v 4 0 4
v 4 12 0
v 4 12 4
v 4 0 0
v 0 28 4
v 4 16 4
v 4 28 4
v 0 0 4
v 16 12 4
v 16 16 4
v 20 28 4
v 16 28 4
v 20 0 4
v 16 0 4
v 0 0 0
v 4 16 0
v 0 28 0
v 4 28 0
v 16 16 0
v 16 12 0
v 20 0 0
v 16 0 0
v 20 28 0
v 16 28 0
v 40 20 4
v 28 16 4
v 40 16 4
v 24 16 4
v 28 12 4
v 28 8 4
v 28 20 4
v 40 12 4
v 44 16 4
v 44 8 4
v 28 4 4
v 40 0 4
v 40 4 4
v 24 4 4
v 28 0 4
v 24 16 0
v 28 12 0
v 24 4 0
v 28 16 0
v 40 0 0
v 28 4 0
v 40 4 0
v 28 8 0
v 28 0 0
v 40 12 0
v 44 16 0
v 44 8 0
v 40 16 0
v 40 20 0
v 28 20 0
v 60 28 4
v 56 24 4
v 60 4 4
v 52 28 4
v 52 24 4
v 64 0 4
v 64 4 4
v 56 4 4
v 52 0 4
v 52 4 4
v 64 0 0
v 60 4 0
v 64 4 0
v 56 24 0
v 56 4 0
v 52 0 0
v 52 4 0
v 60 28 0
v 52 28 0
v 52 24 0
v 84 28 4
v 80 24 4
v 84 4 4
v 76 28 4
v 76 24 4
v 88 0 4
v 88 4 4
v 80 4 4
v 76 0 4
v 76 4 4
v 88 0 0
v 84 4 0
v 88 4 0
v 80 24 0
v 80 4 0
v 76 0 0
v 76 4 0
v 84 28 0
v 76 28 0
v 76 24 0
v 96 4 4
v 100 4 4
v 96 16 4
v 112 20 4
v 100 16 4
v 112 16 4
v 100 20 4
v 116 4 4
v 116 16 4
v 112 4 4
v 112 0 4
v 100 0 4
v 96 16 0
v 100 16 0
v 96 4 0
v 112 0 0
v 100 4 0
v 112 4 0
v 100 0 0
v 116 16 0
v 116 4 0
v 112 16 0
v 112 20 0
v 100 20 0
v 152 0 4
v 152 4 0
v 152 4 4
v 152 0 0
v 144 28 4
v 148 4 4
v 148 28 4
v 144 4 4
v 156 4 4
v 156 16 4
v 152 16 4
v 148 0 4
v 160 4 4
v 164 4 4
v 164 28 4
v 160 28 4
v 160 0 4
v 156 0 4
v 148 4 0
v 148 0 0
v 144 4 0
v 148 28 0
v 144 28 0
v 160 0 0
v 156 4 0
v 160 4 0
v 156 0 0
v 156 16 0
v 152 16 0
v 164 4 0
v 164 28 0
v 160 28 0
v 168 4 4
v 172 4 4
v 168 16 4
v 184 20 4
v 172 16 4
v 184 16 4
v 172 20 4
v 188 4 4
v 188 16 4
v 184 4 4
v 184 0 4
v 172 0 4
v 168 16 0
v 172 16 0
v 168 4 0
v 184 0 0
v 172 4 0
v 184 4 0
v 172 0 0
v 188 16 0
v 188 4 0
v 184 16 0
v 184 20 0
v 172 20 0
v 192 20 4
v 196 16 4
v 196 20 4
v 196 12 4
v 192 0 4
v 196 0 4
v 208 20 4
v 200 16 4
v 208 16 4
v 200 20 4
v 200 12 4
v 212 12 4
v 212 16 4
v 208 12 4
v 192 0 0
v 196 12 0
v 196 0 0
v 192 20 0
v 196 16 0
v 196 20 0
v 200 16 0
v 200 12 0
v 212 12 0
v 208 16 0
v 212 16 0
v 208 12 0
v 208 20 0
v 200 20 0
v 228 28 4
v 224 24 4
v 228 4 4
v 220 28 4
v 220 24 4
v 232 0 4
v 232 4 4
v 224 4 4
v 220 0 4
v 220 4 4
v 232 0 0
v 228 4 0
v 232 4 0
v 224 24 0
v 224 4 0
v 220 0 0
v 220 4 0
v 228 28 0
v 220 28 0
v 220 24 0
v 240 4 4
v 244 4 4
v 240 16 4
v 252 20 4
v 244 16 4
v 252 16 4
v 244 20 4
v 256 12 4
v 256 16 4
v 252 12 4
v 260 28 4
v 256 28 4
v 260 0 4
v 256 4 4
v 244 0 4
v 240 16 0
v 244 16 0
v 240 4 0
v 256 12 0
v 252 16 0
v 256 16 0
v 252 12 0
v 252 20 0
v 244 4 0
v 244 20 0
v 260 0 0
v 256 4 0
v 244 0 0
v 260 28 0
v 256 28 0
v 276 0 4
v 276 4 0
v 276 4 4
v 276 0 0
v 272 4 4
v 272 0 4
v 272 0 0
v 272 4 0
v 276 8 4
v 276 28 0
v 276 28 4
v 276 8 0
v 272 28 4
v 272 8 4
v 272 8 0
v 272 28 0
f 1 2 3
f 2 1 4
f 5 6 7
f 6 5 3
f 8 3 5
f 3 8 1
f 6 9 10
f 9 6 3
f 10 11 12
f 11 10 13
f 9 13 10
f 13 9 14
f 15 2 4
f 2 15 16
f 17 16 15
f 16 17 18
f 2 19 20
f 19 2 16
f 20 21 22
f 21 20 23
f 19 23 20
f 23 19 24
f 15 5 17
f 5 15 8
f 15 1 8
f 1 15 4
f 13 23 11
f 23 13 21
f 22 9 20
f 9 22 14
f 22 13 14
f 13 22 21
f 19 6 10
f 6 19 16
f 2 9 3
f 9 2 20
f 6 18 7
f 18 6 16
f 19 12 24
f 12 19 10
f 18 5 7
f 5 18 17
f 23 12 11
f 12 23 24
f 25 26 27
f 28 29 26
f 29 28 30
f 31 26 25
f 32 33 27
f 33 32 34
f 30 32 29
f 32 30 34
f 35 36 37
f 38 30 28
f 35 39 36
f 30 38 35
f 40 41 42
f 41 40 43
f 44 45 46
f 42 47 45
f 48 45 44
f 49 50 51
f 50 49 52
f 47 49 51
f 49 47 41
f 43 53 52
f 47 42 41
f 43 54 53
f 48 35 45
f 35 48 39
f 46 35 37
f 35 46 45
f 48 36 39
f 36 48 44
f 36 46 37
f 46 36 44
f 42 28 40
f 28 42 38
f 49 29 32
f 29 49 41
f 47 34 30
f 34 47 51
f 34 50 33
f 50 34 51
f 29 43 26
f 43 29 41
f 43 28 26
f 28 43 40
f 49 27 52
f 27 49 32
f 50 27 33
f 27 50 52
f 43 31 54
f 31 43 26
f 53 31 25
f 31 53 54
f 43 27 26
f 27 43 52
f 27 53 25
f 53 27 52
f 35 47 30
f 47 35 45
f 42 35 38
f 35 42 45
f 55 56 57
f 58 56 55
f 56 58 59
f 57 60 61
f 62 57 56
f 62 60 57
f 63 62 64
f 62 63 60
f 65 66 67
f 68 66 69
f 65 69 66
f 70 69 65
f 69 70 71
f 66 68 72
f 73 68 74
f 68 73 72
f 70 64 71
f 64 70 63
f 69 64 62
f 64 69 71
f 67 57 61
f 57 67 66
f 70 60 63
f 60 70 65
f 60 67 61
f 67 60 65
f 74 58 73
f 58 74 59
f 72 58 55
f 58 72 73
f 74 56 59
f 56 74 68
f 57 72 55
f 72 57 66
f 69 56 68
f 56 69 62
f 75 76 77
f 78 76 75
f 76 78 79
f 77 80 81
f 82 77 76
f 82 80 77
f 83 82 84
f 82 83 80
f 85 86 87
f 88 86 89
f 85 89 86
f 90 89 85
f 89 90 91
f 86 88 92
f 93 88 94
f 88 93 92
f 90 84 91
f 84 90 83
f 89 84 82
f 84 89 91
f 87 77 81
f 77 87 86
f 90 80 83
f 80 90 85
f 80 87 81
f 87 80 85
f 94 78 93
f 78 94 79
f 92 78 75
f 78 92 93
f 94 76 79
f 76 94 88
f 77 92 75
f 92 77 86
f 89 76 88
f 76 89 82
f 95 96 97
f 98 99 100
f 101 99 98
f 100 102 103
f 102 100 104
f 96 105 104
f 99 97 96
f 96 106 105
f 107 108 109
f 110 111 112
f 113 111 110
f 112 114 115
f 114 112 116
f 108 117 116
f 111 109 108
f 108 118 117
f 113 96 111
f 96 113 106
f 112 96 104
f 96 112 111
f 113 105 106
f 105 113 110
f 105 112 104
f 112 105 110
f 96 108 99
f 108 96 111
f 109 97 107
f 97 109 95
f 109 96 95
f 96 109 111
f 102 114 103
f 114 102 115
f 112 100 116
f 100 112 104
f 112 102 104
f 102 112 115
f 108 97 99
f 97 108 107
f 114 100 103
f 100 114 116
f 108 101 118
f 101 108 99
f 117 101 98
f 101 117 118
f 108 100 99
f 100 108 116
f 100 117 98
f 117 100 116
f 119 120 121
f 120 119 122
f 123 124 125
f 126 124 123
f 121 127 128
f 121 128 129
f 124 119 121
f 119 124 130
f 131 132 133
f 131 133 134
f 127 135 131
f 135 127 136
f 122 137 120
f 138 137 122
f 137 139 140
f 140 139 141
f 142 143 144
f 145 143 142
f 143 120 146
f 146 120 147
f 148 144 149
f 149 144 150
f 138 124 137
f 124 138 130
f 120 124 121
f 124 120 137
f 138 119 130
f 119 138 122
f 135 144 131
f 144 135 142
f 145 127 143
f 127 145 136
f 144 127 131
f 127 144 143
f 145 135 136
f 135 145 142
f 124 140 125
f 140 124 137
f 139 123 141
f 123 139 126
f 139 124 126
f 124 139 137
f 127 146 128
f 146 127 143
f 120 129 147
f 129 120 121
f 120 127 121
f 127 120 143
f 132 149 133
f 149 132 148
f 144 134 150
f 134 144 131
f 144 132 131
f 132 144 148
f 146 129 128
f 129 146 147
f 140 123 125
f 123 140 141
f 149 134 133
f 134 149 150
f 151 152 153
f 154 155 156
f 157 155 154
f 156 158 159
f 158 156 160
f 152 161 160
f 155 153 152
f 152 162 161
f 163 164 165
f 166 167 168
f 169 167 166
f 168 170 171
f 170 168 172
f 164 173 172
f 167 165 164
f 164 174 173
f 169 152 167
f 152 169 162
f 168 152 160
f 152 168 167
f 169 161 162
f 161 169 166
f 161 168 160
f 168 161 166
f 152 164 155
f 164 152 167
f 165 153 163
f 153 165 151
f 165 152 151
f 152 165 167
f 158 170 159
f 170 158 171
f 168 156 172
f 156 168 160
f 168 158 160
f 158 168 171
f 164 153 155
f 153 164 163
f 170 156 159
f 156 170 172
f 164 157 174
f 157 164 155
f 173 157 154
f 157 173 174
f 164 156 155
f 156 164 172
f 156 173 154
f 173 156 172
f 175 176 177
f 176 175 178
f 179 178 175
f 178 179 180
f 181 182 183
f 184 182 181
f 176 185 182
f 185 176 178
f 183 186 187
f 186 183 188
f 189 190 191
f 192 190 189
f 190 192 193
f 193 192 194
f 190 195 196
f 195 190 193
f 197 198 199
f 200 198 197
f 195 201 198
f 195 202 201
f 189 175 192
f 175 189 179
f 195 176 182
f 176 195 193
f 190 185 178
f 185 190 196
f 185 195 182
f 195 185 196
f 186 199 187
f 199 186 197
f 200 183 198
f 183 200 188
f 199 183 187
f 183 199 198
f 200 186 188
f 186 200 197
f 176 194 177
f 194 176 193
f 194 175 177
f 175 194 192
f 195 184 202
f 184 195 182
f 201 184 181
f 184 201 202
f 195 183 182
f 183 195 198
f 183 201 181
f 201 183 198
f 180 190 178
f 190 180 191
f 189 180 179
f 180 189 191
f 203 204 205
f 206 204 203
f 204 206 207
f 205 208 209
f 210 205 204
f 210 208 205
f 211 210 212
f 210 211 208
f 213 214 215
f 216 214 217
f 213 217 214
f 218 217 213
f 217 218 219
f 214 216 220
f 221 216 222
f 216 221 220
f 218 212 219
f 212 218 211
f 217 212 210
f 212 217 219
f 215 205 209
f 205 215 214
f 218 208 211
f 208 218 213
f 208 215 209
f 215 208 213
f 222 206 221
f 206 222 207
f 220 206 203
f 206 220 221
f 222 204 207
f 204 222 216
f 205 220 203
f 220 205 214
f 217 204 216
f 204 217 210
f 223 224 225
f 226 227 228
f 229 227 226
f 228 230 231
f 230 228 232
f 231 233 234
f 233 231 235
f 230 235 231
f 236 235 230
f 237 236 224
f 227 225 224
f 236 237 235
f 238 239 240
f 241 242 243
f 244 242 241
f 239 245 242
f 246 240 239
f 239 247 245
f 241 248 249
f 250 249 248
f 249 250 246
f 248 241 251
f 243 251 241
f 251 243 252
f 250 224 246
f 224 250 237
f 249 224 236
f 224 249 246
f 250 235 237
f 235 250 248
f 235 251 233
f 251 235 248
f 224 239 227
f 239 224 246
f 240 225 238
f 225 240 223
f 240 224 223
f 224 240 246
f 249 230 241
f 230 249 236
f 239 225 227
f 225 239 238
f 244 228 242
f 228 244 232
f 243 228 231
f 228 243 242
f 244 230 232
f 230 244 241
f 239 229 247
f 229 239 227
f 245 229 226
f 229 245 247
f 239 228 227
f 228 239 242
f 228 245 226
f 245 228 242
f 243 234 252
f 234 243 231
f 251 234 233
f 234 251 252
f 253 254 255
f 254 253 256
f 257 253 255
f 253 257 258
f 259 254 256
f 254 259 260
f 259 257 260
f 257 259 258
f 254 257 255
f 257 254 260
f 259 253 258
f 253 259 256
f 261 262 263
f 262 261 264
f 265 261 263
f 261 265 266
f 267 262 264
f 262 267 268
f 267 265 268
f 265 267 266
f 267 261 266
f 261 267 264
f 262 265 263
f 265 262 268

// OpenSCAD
//Draw text
scale([4,4,4]) drawtext("Hello World!");

//Draw character set
//scale([2,2,2]) drawtext(" !\"#$%&'()*+,-./0123456789:;<=>?@ABCDEFGHIJKLMNOPQRSTUVWXYZ[\\]^_`abcdefghijklmnopqrstuvwxyz{|}");

module drawtext(text) {
	//Characters
	chars = " !\"#$%&'()*+,-./0123456789:;<=>?@ABCDEFGHIJKLMNOPQRSTUVWXYZ[\\]^_`abcdefghijklmnopqrstuvwxyz{|}";

	//Chracter table defining 5x7 characters
	//Adapted from: http://www.geocities.com/dinceraydin/djlcdsim/chartable.js
	char_table = [ [ 0, 0, 0, 0, 0, 0, 0],
                  [ 4, 0, 4, 4, 4, 4, 4],
                  [ 0, 0, 0, 0,10,10,10],
                  [10,10,31,10,31,10,10],
                  [ 4,30, 5,14,20,15, 4],
                  [ 3,19, 8, 4, 2,25,24],
                  [13,18,21, 8,20,18,12],
                  [ 0, 0, 0, 0, 8, 4,12],
                  [ 2, 4, 8, 8, 8, 4, 2],
                  [ 8, 4, 2, 2, 2, 4, 8],
                  [ 0, 4,21,14,21, 4, 0],
                  [ 0, 4, 4,31, 4, 4, 0],
                  [ 8, 4,12, 0, 0, 0, 0],
                  [ 0, 0, 0,31, 0, 0, 0],
                  [12,12, 0, 0, 0, 0, 0],
                  [ 0,16, 8, 4, 2, 1, 0],
                  [14,17,25,21,19,17,14],
                  [14, 4, 4, 4, 4,12, 4],
                  [31, 8, 4, 2, 1,17,14],
                  [14,17, 1, 2, 4, 2,31],
                  [ 2, 2,31,18,10, 6, 2],
                  [14,17, 1, 1,30,16,31],
                  [14,17,17,30,16, 8, 6],
                  [ 8, 8, 8, 4, 2, 1,31],
                  [14,17,17,14,17,17,14],
                  [12, 2, 1,15,17,17,14],
                  [ 0,12,12, 0,12,12, 0],
                  [ 8, 4,12, 0,12,12, 0],
                  [ 2, 4, 8,16, 8, 4, 2],
                  [ 0, 0,31, 0,31, 0, 0],
                  [16, 8, 4, 2, 4, 8,16],
                  [ 4, 0, 4, 2, 1,17,14],
                  [14,21,21,13, 1,17,14],
                  [17,17,31,17,17,17,14],
                  [30,17,17,30,17,17,30],
                  [14,17,16,16,16,17,14],
                  [30,17,17,17,17,17,30],
                  [31,16,16,30,16,16,31],
                  [16,16,16,30,16,16,31],
                  [15,17,17,23,16,17,14],
                  [17,17,17,31,17,17,17],
                  [14, 4, 4, 4, 4, 4,14],
                  [12,18, 2, 2, 2, 2, 7],
                  [17,18,20,24,20,18,17],
                  [31,16,16,16,16,16,16],
                  [17,17,17,21,21,27,17],
                  [17,17,19,21,25,17,17],
                  [14,17,17,17,17,17,14],
                  [16,16,16,30,17,17,30],
                  [13,18,21,17,17,17,14],
                  [17,18,20,30,17,17,30],
                  [30, 1, 1,14,16,16,15],
                  [ 4, 4, 4, 4, 4, 4,31],
                  [14,17,17,17,17,17,17],
                  [ 4,10,17,17,17,17,17],
                  [10,21,21,21,17,17,17],
                  [17,17,10, 4,10,17,17],
                  [ 4, 4, 4,10,17,17,17],
                  [31,16, 8, 4, 2, 1,31],
                  [14, 8, 8, 8, 8, 8,14],
                  [ 0, 1, 2, 4, 8,16, 0],
                  [14, 2, 2, 2, 2, 2,14],
                  [ 0, 0, 0, 0,17,10, 4],
                  [31, 0, 0, 0, 0, 0, 0],
                  [ 0, 0, 0, 0, 2, 4, 8],
                  [15,17,15, 1,14, 0, 0],
                  [30,17,17,25,22,16,16],
                  [14,17,16,16,14, 0, 0],
                  [15,17,17,19,13, 1, 1],
                  [14,16,31,17,14, 0, 0],
                  [ 8, 8, 8,28, 8, 9, 6],
                  [14, 1,15,17,15, 0, 0],
                  [17,17,17,25,22,16,16],
                  [14, 4, 4, 4,12, 0, 4],
                  [12,18, 2, 2, 2, 6, 2],
                  [18,20,24,20,18,16,16],
                  [14, 4, 4, 4, 4, 4,12],
                  [17,17,21,21,26, 0, 0],
                  [17,17,17,25,22, 0, 0],
                  [14,17,17,17,14, 0, 0],
                  [16,16,30,17,30, 0, 0],
                  [ 1, 1,15,19,13, 0, 0],
                  [16,16,16,25,22, 0, 0],
                  [30, 1,14,16,15, 0, 0],
                  [ 6, 9, 8, 8,28, 8, 8],
                  [13,19,17,17,17, 0, 0],
                  [ 4,10,17,17,17, 0, 0],
                  [10,21,21,17,17, 0, 0],
                  [17,10, 4,10,17, 0, 0],
                  [14, 1,15,17,17, 0, 0],
                  [31, 8, 4, 2,31, 0, 0],
                  [ 2, 4, 4, 8, 4, 4, 2],
                  [ 4, 4, 4, 4, 4, 4, 4],
                  [ 8, 4, 4, 2, 4, 4, 8] ];

	//Binary decode table
	dec_table = [ "00000", "00001", "00010", "00011", "00100", "00101",
  	            "00110", "00111", "01000", "01001", "01010", "01011",
  	            "01100", "01101", "01110", "01111", "10000", "10001",
  	            "10010", "10011", "10100", "10101", "10110", "10111",
	            "11000", "11001", "11010", "11011", "11100", "11101",
	            "11110", "11111" ];

	//Process string one character at a time
	for(itext = [0:len(text)-1]) {
		//Convert character to index
		//pavel assign
                let(ichar = search(text[itext],chars,1)[0]) {
			//Decode character - rows
			for(irow = [0:6]) {
				//pavel assign
                let(val = dec_table[char_table[ichar][irow]]) {
					//Decode character - cols
					for(icol = [0:4]) {
	//pavel
                        //assign
                        let(bit = search(val[icol],"01",1)[0]) {
							if(bit) {
								//Output cube
								translate([icol + (6*itext), irow, 0])
									cube([1.0001,1.0001,1]);
							}
						}
					}
				}
			}
		}
	}
}
